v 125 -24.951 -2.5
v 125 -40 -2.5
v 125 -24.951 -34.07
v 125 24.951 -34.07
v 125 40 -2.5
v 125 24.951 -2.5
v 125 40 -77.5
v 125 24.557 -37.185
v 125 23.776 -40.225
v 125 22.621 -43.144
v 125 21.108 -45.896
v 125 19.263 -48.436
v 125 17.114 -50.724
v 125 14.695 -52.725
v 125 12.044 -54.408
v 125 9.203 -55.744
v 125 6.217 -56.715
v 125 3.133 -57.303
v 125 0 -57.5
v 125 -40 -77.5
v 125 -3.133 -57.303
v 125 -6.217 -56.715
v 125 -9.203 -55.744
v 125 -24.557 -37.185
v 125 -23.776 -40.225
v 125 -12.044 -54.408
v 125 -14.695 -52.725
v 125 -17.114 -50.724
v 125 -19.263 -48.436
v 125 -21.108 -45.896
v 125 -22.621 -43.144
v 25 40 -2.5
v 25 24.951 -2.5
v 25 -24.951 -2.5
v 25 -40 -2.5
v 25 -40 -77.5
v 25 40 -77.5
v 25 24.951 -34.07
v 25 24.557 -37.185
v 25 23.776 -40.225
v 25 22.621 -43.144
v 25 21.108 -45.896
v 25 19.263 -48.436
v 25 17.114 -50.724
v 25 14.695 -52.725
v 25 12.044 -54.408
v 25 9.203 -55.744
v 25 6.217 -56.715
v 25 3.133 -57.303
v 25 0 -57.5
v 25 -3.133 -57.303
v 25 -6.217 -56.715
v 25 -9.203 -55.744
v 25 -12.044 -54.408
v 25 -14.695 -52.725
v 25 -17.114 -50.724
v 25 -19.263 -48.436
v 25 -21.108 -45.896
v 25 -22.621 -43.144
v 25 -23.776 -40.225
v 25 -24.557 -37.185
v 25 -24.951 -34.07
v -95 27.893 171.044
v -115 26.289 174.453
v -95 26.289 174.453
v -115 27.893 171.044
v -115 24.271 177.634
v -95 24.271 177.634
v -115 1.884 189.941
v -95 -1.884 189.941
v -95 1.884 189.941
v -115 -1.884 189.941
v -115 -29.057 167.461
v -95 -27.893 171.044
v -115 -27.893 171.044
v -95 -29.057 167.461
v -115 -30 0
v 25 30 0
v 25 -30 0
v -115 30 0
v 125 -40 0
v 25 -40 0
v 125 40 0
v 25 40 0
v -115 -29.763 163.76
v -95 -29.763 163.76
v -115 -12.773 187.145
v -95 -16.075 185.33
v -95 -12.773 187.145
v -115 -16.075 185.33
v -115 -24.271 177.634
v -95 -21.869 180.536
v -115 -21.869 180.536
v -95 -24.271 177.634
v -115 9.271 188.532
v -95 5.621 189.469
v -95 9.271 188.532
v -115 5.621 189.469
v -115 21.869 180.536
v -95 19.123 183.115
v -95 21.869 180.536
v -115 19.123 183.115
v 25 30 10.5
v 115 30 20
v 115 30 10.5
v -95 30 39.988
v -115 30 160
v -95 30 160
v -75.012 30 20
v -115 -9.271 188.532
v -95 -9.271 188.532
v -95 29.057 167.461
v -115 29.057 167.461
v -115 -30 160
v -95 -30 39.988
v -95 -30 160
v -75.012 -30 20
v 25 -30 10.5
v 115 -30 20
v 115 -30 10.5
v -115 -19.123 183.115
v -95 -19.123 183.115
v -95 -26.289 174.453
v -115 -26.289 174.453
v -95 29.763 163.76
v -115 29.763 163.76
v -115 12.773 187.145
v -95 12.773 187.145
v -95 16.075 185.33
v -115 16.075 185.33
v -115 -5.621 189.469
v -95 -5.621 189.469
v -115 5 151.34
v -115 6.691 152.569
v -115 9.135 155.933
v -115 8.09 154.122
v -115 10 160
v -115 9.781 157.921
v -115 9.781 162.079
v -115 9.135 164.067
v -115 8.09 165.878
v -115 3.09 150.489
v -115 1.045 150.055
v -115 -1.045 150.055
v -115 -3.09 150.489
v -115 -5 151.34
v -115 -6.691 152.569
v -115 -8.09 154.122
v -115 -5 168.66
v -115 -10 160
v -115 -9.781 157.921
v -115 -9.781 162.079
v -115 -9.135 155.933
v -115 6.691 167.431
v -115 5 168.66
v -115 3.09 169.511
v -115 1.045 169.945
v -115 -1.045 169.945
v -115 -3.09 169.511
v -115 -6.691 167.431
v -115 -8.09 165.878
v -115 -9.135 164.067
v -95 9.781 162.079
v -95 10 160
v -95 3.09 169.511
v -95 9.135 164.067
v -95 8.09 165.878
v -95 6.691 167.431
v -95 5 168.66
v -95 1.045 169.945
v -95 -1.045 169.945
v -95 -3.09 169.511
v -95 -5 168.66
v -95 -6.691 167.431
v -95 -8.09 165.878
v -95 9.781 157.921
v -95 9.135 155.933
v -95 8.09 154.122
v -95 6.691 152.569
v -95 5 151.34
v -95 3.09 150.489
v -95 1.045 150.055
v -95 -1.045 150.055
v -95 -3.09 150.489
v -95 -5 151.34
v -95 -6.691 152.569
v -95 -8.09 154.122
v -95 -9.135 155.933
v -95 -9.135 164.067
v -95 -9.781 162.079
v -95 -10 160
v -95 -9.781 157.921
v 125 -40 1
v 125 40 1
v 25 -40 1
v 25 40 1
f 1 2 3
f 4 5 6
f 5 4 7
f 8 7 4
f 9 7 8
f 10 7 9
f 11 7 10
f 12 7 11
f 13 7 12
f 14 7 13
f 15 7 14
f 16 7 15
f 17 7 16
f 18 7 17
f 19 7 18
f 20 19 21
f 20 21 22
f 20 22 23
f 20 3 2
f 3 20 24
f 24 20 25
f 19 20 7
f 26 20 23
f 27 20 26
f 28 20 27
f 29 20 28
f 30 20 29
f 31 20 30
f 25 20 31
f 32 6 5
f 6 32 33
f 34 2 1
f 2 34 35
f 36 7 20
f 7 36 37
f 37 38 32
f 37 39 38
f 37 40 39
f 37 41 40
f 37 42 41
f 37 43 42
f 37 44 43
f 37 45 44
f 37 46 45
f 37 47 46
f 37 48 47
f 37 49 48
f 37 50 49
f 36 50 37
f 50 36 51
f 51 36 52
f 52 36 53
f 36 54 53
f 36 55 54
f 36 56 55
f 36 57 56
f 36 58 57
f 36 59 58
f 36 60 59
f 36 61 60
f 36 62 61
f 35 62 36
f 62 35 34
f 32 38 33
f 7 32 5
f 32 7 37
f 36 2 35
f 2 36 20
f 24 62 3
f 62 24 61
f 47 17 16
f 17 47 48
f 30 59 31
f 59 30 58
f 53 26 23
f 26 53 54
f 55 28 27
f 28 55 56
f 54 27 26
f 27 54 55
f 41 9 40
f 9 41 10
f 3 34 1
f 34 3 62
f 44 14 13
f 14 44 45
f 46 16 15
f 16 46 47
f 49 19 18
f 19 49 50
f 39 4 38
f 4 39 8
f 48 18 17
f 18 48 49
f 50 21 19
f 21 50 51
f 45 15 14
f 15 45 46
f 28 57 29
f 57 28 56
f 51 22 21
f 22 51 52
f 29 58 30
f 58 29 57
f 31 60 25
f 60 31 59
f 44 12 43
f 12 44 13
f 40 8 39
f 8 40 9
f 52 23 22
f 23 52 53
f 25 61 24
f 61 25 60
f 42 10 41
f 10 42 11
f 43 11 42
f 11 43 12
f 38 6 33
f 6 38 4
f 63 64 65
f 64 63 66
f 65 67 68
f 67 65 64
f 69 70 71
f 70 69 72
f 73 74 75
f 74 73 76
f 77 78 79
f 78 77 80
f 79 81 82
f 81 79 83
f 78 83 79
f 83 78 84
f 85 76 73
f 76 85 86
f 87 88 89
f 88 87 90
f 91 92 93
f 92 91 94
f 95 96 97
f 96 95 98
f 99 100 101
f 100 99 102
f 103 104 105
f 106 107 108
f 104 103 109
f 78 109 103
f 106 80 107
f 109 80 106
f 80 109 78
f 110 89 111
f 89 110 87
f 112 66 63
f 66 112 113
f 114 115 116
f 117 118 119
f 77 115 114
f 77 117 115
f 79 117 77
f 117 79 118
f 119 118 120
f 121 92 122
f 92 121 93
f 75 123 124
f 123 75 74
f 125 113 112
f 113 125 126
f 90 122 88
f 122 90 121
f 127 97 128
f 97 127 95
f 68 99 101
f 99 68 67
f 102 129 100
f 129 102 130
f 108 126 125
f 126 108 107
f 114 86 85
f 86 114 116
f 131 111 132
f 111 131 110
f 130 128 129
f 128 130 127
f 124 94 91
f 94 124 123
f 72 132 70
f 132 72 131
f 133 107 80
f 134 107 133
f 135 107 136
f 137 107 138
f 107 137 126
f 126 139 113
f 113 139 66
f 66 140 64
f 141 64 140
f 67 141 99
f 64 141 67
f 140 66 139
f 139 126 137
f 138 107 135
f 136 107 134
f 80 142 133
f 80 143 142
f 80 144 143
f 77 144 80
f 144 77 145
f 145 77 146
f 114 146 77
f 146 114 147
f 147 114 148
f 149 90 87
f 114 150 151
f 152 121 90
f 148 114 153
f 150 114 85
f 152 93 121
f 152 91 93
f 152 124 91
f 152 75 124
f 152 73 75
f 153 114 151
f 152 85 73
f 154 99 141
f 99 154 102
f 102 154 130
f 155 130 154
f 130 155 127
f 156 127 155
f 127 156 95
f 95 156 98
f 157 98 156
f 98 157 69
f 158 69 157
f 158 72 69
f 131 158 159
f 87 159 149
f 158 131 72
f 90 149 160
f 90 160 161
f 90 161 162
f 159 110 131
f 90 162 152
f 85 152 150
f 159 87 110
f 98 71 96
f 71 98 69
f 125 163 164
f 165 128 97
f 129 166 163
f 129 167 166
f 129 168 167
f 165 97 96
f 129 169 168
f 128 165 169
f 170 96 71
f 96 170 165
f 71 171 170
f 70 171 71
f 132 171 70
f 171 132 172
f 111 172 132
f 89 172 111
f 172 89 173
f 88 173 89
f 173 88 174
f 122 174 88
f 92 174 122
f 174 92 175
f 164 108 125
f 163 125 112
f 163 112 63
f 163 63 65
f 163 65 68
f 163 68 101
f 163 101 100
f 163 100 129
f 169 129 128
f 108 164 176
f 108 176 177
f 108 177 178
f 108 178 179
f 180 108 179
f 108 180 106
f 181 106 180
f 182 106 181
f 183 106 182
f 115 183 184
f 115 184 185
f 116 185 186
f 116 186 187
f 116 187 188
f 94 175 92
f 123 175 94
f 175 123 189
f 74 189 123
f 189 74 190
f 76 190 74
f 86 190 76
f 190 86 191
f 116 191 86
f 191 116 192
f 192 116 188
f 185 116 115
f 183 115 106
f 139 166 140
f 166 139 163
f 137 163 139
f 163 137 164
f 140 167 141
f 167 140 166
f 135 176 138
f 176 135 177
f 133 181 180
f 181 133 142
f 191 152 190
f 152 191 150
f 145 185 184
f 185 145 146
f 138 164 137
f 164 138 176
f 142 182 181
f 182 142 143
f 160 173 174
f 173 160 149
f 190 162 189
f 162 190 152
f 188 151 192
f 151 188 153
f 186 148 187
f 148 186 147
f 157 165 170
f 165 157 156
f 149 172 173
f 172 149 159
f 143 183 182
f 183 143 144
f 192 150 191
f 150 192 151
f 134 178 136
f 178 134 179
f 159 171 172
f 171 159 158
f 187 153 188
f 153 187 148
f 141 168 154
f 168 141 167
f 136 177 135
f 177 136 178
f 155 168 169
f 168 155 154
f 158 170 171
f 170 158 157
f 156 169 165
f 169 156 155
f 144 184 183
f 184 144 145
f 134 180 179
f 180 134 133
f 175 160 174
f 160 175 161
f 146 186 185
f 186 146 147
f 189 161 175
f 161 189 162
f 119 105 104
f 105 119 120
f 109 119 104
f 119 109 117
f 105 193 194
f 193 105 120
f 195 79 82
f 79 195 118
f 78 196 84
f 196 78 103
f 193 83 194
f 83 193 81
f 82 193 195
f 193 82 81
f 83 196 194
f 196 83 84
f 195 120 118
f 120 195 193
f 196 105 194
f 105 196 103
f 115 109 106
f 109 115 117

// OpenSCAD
/**
 * Pièces support couverture piscine
 */
 
 module A() {
     translate([75,0,-40]) difference() {
        cube([100,80,75], center=true);
        hull() for (z=[20, 50]) translate([0,0,-12.5+z]) rotate([0,90,0]) cylinder(d=50,h=101,$fn=50,center=true);
    }
};

module B() {
    translate([0,0,10]) cube([230,60,20],center=true);
    
    hull() {
        translate([30+45,0,0.5]) cube([100,80,1],center=true);
        translate([25+45,0,10]) cube([90,60,1],center=true);
    }
    
    difference() {
        hull() {
            translate([-60-45,0,10]) cube([20,60,20],center=true);
            translate([-60-45,0,160]) rotate([90,0,90]) cylinder(d=60,h=20,$fn=50,center=true);
        }
        translate([-60-45,0,160]) rotate([90,0,90]) cylinder(d=20,h=21,center=true);
    }
    
    translate([-60-45+sqrt(167),0,10+sqrt(167)]) rotate([0,45,0]) cube([sqrt(800),60,20],center=true);

}

A();
B();
 
 
 
